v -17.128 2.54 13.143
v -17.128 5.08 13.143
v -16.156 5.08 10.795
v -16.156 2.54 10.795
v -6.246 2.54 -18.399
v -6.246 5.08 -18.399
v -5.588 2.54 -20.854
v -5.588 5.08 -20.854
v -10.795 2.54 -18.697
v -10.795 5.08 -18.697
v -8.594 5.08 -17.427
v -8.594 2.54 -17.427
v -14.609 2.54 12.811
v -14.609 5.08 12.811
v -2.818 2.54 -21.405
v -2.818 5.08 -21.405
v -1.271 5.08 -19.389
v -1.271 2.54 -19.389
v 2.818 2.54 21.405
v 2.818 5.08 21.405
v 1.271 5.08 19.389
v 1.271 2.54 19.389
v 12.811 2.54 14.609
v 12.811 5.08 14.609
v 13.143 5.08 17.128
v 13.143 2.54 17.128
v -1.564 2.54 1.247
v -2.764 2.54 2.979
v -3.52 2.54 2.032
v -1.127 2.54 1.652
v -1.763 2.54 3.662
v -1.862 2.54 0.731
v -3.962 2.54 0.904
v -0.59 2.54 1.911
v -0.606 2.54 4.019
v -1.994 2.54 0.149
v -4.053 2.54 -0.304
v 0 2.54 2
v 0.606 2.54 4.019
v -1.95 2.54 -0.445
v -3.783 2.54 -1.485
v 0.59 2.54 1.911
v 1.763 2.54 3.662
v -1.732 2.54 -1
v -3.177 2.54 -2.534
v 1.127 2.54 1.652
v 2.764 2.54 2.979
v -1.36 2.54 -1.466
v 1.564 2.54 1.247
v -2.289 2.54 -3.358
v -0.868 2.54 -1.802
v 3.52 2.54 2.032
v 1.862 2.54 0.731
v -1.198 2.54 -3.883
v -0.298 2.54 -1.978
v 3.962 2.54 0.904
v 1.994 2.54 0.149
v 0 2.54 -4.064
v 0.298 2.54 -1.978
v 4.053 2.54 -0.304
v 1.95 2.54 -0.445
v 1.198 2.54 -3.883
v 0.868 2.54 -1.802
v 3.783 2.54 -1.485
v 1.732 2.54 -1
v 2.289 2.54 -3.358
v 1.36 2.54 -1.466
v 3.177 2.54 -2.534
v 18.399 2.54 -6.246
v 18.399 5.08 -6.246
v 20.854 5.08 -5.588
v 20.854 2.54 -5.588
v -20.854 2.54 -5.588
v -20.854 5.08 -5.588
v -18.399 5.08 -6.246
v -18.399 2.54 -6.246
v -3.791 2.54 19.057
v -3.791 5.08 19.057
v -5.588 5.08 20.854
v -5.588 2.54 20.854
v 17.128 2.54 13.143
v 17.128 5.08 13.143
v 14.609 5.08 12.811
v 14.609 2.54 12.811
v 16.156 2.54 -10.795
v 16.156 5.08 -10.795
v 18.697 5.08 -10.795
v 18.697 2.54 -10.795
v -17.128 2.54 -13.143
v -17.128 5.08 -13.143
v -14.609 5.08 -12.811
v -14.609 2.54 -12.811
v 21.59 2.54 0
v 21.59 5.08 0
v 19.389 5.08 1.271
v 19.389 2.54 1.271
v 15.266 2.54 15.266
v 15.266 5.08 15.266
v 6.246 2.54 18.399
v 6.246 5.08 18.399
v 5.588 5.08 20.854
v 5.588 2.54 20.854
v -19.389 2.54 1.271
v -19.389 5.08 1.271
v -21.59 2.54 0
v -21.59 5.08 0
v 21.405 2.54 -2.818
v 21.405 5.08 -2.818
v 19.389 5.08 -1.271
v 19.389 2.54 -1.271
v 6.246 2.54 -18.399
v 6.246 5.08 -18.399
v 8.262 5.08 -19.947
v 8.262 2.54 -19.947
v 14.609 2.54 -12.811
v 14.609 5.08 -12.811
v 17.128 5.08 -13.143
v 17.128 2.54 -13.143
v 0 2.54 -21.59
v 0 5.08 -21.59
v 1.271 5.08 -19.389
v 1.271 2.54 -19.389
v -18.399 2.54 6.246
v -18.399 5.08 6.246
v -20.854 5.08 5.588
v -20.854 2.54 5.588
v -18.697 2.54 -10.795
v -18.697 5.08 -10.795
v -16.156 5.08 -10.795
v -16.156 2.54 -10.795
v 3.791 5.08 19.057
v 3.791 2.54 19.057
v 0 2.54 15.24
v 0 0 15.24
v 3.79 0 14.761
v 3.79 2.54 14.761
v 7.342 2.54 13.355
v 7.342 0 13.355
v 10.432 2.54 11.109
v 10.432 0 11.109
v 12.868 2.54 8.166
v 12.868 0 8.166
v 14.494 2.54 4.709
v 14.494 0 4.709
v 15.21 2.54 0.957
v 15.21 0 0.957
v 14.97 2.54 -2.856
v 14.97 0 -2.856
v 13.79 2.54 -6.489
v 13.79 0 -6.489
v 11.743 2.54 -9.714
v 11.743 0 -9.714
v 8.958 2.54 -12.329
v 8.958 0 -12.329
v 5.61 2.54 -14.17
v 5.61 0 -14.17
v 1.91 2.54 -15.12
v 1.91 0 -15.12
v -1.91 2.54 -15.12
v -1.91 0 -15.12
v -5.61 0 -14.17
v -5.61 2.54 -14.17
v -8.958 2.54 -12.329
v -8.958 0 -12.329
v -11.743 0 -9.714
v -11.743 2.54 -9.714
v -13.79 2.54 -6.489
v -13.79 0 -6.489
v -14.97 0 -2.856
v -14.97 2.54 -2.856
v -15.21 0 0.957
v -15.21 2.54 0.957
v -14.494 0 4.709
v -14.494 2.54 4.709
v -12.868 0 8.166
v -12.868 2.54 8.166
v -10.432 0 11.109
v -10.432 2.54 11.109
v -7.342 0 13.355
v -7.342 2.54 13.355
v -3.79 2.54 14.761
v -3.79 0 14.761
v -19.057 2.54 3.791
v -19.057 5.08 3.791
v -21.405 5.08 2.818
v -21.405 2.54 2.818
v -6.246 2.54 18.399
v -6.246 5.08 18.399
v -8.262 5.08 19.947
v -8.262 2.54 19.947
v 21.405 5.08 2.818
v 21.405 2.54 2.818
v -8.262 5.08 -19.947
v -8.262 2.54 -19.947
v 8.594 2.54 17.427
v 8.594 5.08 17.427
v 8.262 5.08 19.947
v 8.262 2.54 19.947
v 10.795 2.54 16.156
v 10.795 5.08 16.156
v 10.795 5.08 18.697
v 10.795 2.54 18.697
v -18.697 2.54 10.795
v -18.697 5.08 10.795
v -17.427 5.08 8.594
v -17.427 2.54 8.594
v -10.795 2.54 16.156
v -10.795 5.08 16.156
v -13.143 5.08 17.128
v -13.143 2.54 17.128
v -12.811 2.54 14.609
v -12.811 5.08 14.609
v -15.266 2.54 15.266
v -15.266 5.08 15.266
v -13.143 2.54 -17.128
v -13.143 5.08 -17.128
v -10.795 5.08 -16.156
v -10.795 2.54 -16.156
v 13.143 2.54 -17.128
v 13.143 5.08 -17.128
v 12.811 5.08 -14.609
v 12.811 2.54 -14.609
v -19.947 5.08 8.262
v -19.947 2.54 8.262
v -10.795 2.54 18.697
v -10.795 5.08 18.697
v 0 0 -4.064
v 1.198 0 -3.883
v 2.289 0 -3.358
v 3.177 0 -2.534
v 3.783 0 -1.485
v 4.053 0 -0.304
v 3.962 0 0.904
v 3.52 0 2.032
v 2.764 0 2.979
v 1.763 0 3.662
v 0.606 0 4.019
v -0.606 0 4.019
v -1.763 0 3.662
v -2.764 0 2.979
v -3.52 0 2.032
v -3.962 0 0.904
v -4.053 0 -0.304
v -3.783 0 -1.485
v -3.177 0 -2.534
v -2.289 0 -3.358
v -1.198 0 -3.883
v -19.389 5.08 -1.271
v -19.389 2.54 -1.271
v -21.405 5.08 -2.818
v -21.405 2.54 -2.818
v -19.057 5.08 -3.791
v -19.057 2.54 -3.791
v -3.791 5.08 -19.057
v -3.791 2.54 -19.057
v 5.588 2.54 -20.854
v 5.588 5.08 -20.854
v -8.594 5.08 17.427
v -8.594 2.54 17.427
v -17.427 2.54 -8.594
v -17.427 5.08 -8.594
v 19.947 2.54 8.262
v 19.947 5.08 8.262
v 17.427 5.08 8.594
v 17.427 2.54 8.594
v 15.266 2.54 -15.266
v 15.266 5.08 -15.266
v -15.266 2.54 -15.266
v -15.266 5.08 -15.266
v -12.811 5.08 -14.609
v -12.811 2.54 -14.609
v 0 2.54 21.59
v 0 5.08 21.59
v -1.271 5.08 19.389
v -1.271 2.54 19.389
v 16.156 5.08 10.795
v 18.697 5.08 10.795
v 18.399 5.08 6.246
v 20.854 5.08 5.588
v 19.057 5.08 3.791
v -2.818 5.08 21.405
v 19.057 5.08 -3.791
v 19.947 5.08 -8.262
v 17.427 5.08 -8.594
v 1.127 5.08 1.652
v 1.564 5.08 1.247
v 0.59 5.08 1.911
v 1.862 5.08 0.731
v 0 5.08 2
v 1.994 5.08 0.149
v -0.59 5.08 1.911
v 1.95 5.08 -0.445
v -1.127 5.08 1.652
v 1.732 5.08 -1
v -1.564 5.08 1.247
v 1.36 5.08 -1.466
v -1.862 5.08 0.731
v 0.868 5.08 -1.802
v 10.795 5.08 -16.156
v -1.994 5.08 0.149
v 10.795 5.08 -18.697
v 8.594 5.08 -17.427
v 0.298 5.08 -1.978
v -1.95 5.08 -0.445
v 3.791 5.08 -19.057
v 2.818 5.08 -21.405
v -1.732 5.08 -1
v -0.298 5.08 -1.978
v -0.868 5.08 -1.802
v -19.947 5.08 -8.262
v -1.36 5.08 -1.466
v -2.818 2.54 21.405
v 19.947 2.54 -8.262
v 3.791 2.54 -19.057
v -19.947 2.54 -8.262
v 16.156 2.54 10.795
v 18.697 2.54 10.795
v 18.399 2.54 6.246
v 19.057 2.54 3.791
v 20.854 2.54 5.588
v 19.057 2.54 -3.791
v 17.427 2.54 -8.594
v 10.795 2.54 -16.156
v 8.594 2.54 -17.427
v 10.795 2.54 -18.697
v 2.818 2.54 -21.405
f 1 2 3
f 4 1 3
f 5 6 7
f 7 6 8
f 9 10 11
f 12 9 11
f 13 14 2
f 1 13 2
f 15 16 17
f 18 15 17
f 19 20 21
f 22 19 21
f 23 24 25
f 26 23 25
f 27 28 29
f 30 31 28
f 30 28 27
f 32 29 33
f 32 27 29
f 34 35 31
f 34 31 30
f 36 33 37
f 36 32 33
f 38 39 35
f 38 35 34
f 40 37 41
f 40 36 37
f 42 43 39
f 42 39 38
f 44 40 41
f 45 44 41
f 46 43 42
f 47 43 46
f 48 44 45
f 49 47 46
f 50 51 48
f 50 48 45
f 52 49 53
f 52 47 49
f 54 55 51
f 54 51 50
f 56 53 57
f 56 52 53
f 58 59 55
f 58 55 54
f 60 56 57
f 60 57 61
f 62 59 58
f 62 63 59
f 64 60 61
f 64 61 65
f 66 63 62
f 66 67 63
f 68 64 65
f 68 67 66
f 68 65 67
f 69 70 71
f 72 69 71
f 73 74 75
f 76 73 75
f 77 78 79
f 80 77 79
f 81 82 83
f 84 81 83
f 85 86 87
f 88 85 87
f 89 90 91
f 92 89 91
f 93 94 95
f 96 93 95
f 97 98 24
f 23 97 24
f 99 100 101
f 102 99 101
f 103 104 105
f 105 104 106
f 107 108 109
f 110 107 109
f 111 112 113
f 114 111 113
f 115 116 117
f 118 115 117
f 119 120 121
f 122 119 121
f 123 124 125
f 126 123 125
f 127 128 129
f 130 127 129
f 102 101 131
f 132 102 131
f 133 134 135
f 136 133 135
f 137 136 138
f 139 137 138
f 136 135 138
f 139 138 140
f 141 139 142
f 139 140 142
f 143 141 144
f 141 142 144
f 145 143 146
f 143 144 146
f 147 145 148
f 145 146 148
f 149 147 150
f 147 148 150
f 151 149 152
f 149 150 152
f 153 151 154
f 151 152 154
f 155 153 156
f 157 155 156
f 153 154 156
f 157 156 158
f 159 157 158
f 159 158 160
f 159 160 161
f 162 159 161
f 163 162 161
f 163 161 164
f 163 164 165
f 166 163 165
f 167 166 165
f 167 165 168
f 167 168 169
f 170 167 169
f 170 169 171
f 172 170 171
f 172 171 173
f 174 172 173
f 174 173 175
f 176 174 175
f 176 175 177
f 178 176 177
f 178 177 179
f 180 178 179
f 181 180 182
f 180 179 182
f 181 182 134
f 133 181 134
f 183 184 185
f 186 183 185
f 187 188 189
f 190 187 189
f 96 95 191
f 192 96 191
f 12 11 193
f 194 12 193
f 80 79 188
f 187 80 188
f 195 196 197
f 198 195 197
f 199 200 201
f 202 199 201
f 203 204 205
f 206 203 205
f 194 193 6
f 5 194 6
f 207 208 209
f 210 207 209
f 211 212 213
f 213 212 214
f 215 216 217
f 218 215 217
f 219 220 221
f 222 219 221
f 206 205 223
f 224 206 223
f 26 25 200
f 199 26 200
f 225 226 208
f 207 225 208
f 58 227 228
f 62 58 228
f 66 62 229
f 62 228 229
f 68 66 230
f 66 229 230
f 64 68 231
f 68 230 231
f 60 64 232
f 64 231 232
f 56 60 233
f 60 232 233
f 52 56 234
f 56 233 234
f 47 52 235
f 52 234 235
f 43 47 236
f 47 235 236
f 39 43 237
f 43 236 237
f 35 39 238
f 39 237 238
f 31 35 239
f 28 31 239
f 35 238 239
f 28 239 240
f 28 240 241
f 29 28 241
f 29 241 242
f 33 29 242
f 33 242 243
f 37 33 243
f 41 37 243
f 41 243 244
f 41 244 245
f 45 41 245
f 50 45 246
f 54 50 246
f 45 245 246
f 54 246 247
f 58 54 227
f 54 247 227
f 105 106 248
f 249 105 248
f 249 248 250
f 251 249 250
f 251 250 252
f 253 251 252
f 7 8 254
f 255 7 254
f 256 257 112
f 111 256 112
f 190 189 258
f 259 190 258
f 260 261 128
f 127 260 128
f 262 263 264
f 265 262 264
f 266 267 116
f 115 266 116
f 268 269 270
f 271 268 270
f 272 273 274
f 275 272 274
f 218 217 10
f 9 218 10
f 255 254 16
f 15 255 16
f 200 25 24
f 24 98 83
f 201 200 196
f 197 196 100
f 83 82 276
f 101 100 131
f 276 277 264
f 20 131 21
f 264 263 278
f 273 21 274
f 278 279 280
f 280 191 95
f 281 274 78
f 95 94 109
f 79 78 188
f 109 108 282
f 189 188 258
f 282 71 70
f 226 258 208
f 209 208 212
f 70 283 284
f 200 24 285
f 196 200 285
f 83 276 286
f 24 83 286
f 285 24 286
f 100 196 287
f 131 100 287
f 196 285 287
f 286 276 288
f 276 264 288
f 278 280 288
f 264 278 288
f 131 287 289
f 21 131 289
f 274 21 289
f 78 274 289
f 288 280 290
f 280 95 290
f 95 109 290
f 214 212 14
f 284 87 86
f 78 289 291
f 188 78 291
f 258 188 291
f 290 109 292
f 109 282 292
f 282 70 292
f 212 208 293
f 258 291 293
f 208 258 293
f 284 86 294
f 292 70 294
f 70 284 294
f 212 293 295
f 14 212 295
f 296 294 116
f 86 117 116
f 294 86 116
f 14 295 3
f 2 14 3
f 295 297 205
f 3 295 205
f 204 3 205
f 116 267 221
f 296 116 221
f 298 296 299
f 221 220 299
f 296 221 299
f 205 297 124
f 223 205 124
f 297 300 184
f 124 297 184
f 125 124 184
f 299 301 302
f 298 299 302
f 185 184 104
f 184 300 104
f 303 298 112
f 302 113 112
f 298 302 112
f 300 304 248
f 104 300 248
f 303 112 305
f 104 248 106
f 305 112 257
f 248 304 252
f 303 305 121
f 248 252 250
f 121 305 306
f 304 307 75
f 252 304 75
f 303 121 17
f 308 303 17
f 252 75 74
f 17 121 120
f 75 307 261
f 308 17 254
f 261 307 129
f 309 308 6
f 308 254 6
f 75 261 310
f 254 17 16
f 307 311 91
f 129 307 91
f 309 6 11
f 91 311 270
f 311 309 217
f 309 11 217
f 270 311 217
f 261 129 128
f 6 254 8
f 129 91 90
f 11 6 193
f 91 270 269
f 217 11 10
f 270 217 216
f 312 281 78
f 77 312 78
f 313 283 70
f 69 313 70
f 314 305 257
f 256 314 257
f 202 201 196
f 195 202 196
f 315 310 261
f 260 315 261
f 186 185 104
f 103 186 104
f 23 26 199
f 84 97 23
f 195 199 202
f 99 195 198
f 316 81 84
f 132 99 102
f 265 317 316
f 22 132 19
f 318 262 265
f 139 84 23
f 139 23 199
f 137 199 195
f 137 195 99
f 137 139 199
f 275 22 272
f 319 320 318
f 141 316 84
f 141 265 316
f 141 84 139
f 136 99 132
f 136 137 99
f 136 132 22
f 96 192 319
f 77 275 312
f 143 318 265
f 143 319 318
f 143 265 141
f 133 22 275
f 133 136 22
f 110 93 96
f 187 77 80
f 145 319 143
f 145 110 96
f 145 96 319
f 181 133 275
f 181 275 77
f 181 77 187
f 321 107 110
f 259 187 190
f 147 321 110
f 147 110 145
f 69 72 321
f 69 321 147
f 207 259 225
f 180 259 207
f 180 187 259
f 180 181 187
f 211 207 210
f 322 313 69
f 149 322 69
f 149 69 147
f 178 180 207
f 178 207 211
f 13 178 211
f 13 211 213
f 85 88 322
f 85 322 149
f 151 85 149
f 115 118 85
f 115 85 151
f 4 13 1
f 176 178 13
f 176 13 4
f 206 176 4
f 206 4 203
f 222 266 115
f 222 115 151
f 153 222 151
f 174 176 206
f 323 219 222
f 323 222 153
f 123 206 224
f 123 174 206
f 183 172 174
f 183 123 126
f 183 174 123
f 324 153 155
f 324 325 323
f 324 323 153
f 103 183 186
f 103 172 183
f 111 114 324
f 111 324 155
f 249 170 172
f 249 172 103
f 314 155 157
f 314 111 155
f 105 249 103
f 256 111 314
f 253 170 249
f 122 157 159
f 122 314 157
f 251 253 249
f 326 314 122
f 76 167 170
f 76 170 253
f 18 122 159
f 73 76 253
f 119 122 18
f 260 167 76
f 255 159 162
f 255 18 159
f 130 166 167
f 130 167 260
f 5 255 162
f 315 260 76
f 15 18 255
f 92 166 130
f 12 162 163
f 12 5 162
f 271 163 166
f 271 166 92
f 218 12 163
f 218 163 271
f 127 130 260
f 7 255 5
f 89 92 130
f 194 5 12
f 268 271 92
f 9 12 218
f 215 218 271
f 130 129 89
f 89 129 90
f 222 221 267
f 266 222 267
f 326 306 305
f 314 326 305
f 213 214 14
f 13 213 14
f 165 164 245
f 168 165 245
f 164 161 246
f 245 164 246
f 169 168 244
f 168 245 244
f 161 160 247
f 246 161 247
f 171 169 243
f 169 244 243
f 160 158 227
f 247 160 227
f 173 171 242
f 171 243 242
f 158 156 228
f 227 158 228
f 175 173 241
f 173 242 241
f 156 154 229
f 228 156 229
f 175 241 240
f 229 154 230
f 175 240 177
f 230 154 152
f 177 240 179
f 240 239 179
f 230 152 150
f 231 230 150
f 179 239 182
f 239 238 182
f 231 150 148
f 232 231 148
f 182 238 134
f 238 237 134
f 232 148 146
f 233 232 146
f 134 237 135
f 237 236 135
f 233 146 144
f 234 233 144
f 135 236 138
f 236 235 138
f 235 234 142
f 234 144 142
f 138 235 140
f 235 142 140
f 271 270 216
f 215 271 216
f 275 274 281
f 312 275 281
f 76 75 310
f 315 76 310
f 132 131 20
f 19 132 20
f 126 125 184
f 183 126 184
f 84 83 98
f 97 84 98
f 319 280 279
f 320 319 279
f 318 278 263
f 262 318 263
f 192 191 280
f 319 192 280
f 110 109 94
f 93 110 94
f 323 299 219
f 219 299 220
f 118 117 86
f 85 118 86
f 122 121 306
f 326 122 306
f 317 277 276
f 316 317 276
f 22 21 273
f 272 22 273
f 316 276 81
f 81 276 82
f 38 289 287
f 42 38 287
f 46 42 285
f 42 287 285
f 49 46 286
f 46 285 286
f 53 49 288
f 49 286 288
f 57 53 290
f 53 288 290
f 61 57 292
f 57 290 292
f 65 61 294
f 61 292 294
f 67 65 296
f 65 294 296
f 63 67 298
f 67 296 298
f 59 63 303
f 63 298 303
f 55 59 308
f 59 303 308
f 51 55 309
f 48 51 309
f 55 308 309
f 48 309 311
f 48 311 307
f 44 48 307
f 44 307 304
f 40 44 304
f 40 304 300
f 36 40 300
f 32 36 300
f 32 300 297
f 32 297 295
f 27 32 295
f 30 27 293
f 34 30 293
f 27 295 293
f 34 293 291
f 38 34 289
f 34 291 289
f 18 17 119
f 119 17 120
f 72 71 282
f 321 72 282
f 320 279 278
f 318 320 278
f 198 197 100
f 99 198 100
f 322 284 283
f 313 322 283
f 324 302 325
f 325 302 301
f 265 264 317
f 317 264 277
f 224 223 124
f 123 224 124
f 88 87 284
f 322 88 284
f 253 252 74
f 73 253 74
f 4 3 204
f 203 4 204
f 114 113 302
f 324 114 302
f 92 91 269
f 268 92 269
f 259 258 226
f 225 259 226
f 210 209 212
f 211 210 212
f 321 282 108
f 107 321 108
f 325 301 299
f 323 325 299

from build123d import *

# Parameters (mm, degrees)
SKETCH1_R           = 15.24
BOSS_EXTRUDE1_DEPTH = 5.08
BOSS_EXTRUDE3_DEPTH = 2.54
CIRPATTERN1_COUNT   = 48
SKETCH6_R           = 4.064
CUT_EXTRUDE1_DEPTH  = 2.54
SKETCH7_R           = 2.000000064
CUT_EXTRUDE2_DEPTH  = 2.54


with BuildPart() as part:
    # Sketch1 → Boss-Extrude1 (new body)
    with BuildSketch(Plane(origin=(0, 0, 0), x_dir=(1, 0, 0), z_dir=(0, 1, 0))):
        Circle(SKETCH1_R)
    extrude(amount=BOSS_EXTRUDE1_DEPTH)

    # Sketch3 → Boss-Extrude3 (add)
    with BuildSketch(Plane(origin=(0, 5.08, 0), x_dir=(1, 0, 0), z_dir=(0, 1, 0))):
        Polygon((0, 21.59), (3.969953129, 14.713839477), (-3.969953129, 14.713839477), align=None)
    boss_extrude3 = extrude(amount=-BOSS_EXTRUDE3_DEPTH)

    # CirPattern1: Boss-Extrude3 ×48 about axis
    cirpattern1_axis = Axis((0, -0.127, 0), (0, 1, 0))
    for i in range(1, CIRPATTERN1_COUNT):
        add(boss_extrude3.rotate(cirpattern1_axis, i * 360 / CIRPATTERN1_COUNT))

    # Sketch6 → Cut-Extrude1 (cut)
    with BuildSketch(Plane.XZ):
        Circle(SKETCH6_R)
    extrude(amount=-CUT_EXTRUDE1_DEPTH, mode=Mode.SUBTRACT)

    # Sketch7 → Cut-Extrude2 (cut)
    with BuildSketch(Plane(origin=(0, 5.08, 0), x_dir=(1, 0, 0), z_dir=(0, 1, 0))):
        Circle(SKETCH7_R)
    extrude(amount=-CUT_EXTRUDE2_DEPTH, mode=Mode.SUBTRACT)


solid = part.part
